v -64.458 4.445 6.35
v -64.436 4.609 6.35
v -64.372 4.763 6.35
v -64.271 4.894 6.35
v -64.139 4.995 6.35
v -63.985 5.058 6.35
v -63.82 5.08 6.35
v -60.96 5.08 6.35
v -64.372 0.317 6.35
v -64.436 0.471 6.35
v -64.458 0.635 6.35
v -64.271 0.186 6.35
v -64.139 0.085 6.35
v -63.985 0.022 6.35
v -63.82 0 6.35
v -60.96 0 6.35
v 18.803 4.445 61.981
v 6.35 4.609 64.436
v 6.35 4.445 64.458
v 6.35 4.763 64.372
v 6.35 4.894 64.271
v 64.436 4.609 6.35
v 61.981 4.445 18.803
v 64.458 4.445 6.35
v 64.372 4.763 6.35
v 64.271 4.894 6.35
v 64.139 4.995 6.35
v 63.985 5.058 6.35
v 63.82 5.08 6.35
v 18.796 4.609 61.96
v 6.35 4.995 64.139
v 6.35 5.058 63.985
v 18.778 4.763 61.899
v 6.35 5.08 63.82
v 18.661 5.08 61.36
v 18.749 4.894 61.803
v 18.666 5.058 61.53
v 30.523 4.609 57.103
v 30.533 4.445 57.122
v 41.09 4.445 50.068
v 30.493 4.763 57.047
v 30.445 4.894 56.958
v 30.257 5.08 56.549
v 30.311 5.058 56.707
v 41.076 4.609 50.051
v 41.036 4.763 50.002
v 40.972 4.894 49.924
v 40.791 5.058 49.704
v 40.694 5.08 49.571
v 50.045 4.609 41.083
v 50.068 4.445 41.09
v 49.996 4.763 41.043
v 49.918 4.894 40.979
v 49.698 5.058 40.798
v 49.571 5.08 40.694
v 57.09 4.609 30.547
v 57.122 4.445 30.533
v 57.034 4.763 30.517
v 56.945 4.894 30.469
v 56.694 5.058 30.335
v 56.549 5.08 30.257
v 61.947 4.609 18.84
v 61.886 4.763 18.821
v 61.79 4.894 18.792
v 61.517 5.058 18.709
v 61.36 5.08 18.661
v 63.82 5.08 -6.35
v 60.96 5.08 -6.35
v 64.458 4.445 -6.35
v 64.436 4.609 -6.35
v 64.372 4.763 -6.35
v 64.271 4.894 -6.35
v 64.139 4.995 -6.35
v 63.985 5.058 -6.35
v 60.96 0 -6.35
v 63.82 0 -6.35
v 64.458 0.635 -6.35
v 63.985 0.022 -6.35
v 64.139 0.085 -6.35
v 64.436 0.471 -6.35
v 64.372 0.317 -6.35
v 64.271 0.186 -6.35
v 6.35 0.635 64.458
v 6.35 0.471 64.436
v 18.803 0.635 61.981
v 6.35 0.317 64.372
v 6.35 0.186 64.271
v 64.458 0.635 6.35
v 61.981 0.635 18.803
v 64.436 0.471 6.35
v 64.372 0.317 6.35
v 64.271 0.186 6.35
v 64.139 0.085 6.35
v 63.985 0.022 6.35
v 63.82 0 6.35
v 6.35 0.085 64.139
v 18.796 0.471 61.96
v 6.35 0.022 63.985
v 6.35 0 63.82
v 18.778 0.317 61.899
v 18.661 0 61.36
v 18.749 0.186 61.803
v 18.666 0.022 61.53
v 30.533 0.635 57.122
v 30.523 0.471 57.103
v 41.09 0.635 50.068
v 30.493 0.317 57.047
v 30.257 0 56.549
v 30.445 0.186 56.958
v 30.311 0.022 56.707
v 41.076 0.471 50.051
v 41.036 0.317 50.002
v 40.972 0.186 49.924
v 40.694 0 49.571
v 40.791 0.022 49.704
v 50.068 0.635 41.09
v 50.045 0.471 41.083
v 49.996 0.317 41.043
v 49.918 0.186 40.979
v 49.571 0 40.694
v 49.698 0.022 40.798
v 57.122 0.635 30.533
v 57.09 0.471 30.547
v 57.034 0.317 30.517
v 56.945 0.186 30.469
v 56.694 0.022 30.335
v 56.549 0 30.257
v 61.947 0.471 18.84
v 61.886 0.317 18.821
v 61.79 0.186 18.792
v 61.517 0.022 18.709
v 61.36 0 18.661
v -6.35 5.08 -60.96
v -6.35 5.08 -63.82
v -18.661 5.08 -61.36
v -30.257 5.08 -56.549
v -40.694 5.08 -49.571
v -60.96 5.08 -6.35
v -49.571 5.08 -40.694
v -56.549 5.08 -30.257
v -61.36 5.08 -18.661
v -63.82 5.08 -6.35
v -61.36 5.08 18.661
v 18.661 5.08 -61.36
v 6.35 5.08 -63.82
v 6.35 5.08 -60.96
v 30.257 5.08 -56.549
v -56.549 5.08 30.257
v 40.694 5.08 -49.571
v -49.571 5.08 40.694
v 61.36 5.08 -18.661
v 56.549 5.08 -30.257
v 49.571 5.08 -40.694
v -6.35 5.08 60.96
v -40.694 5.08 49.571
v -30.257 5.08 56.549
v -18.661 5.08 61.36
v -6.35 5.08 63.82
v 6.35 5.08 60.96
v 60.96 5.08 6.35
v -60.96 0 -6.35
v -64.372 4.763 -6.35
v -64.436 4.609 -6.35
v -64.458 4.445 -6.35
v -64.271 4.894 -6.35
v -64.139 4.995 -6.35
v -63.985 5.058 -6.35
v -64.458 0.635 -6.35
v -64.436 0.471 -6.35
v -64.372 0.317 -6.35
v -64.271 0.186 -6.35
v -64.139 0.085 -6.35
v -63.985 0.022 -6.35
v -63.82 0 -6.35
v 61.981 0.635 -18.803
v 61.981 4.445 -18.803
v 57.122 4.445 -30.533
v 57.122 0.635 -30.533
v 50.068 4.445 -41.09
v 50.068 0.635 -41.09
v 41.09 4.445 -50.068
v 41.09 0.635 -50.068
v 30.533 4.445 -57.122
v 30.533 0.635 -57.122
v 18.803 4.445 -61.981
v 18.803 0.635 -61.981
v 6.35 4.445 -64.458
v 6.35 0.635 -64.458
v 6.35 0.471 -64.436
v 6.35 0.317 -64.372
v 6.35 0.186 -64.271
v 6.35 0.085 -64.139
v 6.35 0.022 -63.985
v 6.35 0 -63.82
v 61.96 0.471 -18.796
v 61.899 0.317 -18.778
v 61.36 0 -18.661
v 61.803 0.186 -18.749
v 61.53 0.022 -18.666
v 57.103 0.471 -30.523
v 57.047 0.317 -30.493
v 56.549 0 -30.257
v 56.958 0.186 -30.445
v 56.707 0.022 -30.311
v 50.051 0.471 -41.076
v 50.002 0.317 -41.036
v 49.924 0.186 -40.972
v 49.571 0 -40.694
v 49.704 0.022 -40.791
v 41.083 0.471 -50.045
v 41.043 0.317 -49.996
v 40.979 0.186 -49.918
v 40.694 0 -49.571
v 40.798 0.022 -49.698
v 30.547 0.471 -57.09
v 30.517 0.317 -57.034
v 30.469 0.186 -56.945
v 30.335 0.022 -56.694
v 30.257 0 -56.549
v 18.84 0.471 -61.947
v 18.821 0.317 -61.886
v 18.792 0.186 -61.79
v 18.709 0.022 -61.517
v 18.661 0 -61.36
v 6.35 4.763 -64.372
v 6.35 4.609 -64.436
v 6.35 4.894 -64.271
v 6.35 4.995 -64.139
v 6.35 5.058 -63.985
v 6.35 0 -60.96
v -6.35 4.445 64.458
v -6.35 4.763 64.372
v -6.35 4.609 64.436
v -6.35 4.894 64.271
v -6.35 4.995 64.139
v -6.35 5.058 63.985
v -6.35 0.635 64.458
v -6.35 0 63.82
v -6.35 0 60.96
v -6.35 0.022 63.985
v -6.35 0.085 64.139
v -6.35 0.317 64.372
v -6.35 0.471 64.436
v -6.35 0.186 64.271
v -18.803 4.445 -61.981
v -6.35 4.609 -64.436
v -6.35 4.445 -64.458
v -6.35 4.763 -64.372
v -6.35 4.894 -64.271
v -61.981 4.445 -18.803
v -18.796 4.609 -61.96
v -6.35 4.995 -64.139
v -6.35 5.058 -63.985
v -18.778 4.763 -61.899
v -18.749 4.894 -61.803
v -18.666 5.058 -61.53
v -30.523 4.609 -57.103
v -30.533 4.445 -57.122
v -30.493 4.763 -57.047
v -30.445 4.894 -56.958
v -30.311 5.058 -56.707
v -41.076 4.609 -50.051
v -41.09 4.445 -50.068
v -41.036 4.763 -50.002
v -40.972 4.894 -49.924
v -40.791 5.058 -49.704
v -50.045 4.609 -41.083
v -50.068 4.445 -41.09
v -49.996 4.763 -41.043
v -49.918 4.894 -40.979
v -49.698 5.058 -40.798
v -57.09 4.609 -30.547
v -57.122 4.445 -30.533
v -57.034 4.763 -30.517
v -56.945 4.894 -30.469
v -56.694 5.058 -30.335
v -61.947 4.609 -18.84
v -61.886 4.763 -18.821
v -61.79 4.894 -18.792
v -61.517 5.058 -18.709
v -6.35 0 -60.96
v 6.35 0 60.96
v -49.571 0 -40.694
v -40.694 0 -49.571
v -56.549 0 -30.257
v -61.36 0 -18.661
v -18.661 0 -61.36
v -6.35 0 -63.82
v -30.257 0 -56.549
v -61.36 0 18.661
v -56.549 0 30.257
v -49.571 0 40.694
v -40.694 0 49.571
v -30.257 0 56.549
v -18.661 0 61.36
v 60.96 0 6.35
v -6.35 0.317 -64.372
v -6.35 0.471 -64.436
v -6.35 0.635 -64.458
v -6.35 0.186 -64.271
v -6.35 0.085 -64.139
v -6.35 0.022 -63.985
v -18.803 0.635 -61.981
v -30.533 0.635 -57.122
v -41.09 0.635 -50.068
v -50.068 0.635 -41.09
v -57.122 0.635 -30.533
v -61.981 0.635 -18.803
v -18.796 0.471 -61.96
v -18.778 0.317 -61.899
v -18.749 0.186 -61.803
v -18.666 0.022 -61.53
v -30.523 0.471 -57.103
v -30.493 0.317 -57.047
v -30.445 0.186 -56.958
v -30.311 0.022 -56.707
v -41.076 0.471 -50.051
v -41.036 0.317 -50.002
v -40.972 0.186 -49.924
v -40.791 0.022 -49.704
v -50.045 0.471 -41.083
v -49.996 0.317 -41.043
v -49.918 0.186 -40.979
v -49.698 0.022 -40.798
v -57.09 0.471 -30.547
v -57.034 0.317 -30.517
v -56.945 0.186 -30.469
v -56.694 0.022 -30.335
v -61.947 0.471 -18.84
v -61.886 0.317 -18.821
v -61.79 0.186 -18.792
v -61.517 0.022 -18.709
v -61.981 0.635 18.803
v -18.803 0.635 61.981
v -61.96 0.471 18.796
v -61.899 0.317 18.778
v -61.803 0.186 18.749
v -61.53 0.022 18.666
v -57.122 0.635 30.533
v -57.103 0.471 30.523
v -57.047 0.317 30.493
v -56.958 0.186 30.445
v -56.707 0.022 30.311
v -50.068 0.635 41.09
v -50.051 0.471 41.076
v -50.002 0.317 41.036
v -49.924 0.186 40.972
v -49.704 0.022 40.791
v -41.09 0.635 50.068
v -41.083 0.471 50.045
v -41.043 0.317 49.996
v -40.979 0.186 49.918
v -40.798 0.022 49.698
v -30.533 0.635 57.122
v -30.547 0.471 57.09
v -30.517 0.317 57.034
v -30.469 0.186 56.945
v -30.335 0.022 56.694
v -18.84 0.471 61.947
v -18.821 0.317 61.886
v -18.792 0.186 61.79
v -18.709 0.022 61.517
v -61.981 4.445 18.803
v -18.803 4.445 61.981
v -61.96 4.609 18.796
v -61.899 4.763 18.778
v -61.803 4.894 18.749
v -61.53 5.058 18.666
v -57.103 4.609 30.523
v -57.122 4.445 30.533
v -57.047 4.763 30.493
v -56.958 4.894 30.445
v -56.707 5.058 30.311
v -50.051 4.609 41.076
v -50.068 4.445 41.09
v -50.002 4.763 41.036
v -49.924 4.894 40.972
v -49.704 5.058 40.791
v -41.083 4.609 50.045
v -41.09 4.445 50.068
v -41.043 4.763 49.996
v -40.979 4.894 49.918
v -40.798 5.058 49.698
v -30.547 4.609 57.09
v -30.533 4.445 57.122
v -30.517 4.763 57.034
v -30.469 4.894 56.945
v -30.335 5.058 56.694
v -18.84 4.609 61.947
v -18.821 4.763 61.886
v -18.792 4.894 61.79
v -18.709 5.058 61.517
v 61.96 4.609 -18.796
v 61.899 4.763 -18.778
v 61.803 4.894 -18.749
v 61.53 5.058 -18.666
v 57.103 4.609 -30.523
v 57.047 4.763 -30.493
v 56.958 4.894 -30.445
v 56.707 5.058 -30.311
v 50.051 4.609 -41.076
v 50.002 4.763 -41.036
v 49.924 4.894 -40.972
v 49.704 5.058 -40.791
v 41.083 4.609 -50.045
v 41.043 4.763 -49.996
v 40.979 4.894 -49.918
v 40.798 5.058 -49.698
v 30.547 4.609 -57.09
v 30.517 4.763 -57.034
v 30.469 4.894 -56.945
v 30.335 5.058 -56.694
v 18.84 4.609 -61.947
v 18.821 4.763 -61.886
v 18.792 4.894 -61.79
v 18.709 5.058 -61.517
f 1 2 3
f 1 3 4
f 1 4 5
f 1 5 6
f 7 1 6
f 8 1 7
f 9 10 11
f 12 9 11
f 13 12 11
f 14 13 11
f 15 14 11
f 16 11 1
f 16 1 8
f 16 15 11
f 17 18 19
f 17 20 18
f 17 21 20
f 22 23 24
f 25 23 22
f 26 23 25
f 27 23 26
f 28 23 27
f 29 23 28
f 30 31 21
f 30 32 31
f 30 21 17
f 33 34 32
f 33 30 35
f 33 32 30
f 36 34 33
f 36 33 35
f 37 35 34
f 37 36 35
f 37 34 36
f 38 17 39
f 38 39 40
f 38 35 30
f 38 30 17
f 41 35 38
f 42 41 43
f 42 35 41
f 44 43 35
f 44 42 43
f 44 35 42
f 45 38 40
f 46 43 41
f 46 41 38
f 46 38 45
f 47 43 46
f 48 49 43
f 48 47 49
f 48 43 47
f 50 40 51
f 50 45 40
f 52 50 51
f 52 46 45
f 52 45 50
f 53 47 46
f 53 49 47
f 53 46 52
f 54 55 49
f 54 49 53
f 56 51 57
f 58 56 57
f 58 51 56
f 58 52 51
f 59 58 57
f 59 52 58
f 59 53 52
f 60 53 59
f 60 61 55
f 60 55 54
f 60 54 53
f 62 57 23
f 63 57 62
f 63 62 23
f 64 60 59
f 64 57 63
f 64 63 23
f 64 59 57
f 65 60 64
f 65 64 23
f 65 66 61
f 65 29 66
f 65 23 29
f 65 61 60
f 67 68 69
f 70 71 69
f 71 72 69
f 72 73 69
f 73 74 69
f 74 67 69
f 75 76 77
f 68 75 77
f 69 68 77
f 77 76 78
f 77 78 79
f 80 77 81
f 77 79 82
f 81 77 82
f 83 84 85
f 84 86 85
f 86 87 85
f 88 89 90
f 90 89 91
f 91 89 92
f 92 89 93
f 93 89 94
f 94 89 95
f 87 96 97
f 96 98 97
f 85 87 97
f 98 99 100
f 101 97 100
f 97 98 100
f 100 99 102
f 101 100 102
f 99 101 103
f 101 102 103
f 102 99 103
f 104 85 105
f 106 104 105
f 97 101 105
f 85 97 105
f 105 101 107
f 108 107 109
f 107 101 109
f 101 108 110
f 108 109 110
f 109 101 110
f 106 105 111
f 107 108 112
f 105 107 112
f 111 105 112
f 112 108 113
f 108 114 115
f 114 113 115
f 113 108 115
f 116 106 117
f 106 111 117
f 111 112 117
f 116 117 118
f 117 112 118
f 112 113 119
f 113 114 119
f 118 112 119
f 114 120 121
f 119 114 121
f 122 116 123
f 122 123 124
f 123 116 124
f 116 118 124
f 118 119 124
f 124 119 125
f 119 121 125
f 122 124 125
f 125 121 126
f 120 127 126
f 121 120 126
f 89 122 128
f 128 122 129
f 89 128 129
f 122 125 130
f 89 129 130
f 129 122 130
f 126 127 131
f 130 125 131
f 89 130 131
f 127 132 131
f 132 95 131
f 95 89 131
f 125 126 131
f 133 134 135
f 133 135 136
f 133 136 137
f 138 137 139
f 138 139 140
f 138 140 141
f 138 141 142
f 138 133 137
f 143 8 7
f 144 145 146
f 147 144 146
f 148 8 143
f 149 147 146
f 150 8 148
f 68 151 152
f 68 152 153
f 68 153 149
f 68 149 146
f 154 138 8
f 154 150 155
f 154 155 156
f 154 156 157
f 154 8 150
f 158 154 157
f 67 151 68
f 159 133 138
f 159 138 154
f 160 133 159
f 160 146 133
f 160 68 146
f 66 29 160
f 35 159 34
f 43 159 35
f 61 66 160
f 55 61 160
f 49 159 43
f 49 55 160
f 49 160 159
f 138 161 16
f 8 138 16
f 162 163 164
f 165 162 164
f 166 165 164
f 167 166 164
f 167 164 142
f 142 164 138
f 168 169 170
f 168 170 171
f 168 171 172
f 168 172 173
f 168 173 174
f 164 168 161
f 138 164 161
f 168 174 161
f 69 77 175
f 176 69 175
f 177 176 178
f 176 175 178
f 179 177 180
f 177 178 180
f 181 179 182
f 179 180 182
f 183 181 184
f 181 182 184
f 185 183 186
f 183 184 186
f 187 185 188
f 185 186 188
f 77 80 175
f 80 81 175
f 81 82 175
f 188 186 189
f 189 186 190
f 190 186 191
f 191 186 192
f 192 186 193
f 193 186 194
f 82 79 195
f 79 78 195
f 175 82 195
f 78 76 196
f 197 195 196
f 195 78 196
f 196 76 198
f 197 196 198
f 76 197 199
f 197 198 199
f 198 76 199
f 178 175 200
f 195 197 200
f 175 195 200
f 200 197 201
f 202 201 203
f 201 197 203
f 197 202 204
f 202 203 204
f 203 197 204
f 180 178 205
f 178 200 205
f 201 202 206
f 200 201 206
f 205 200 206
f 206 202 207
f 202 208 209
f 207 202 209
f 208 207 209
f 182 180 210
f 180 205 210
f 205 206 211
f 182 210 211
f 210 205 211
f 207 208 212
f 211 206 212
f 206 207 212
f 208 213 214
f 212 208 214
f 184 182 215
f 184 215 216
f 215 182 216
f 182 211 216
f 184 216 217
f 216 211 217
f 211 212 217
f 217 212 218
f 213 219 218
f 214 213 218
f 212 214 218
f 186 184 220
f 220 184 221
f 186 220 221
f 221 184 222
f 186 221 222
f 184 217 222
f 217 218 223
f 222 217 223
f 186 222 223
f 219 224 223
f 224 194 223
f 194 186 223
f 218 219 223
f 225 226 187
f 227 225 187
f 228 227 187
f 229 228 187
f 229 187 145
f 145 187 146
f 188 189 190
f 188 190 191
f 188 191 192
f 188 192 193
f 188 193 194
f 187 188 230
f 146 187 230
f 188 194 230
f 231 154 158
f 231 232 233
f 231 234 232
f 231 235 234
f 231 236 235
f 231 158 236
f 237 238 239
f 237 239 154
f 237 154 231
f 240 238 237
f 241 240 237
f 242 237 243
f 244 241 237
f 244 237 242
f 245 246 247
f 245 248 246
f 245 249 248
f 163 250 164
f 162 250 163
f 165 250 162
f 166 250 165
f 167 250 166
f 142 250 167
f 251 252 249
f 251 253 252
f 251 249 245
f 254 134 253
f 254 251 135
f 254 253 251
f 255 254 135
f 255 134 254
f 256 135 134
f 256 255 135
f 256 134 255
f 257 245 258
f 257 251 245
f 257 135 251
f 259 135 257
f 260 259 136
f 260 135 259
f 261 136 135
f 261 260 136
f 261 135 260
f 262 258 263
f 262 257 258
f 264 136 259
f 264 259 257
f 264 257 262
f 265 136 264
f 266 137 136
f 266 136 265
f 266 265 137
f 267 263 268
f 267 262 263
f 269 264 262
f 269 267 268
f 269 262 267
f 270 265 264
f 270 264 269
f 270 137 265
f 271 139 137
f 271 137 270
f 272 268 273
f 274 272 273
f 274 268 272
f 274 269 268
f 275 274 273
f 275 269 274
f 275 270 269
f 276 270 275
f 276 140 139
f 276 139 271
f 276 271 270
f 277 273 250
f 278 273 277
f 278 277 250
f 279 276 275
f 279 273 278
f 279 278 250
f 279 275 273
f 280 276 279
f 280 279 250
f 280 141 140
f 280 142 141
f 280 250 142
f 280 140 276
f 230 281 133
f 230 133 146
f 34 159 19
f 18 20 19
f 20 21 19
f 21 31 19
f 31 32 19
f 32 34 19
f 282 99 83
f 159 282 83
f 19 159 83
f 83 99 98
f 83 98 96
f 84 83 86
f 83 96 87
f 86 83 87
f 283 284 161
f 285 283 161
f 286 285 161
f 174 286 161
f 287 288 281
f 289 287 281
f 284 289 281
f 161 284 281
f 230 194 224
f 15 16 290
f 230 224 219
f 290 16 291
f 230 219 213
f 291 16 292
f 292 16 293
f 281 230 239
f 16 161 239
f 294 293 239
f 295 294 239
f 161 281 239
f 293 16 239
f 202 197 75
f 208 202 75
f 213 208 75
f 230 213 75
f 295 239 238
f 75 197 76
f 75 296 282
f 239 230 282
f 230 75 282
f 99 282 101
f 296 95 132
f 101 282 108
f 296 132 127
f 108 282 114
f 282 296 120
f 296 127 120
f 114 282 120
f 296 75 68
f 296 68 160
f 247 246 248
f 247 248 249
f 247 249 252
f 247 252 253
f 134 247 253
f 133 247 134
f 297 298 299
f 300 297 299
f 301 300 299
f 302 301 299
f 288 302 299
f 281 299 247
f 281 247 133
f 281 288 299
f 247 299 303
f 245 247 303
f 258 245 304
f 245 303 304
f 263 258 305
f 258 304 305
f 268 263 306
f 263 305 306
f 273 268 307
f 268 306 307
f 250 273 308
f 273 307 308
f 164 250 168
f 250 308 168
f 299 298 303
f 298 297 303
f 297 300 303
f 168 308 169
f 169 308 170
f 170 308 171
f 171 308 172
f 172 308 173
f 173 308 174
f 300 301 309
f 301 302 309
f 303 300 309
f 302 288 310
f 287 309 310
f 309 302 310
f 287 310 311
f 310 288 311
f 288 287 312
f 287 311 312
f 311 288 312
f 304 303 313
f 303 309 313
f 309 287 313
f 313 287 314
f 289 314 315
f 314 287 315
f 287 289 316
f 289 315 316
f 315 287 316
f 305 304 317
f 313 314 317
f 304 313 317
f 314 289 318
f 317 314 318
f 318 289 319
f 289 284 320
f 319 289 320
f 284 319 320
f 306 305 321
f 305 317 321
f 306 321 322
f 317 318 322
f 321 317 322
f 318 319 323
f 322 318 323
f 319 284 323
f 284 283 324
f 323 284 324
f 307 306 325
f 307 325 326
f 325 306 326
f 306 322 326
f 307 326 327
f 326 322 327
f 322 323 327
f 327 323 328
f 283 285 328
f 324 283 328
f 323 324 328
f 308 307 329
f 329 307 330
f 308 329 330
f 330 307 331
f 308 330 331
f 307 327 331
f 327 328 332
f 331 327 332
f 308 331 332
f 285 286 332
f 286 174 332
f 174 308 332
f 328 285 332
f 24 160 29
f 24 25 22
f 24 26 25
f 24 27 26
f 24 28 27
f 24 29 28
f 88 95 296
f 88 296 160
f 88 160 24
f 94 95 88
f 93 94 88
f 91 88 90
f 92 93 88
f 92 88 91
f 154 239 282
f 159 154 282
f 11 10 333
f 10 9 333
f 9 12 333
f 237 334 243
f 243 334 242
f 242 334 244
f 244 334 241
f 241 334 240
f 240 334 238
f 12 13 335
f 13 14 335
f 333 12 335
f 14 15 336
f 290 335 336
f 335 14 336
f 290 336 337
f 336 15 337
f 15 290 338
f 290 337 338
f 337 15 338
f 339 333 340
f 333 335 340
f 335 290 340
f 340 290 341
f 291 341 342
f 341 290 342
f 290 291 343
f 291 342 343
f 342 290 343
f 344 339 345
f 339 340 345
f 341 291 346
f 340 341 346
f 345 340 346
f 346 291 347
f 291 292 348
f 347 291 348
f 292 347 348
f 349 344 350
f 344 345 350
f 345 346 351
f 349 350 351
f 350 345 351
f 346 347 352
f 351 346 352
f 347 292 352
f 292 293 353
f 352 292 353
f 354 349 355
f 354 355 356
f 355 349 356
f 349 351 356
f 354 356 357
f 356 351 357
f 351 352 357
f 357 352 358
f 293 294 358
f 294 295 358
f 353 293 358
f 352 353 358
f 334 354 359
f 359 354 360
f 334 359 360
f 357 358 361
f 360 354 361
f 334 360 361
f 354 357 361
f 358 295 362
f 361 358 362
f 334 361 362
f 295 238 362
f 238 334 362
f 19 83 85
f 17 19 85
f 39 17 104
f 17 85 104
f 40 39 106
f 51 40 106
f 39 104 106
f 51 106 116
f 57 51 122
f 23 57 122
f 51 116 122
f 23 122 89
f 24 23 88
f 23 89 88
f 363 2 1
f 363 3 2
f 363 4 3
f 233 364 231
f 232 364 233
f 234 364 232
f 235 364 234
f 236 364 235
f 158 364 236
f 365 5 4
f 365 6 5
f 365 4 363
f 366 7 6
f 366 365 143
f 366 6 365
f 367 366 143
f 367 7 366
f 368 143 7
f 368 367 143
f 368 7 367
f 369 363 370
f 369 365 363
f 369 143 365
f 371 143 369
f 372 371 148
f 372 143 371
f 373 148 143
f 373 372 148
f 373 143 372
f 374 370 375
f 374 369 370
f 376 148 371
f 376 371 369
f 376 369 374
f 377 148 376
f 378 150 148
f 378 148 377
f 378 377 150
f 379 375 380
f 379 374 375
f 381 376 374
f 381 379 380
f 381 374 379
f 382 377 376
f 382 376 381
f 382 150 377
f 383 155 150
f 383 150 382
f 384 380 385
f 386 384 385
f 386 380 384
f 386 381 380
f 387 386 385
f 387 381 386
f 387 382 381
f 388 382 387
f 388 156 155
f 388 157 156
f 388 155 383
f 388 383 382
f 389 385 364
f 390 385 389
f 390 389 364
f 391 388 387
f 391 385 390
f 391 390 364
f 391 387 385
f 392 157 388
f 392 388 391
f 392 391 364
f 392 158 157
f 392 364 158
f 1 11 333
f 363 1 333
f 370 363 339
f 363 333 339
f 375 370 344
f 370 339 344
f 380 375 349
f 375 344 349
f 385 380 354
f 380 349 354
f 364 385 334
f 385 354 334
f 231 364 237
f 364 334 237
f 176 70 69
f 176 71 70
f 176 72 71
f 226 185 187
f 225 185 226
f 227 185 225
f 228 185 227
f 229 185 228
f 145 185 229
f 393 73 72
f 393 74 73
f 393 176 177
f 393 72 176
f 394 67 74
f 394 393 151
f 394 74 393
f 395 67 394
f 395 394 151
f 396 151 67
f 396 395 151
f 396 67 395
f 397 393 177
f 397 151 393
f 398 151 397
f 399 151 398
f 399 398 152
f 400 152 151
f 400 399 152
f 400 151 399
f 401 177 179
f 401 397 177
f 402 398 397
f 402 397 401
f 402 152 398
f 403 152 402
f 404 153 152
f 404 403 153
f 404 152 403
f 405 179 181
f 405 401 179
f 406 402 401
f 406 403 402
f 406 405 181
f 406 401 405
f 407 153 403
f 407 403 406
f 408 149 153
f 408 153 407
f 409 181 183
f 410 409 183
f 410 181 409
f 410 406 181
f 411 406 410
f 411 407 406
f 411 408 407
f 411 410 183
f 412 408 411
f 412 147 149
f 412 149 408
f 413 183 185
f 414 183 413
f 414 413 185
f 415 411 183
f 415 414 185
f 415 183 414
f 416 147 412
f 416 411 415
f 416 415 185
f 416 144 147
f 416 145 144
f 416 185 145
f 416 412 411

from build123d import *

# Parameters (mm, degrees)
SKETCH2_R           = 64.77
BOSS_EXTRUDE1_DEPTH = 5.08
FILLET1_R           = 0.635
SKETCH3_W           = 12.7
SKETCH3_H           = 15.225369524
SKETCH3_W_2         = 15.225369524
SKETCH3_H_2         = 12.7
CUT_EXTRUDE1_DEPTH  = 92.739371117


with BuildPart() as part:
    # Sketch2 → Boss-Extrude1 (new body)
    with BuildSketch(Plane(origin=(0, 0, 0), x_dir=(1, 0, 0), z_dir=(0, 1, 0))):
        with Locations(Location((0, 0, 0), (0, 0, 270))):
            Circle(SKETCH2_R)
    extrude(amount=BOSS_EXTRUDE1_DEPTH)

    # Fillet1
    fillet1_edges = [part.edges().sort_by_distance(p)[0] for p in [
        (0, 0, -64.77),
        (0, 5.08, -64.77),
    ]]
    fillet(fillet1_edges, radius=FILLET1_R)

    # Sketch3 → Cut-Extrude1 (cut, through all)
    with BuildSketch(Plane.XZ):
        with Locations((0, 68.572684762)):
            Rectangle(SKETCH3_W, SKETCH3_H)
        with Locations((68.572684762, 0)):
            Rectangle(SKETCH3_W_2, SKETCH3_H_2)
        with Locations((0, -68.572684762)):
            Rectangle(SKETCH3_W, SKETCH3_H)
        with Locations((-68.572684762, 0)):
            Rectangle(SKETCH3_W_2, SKETCH3_H_2)
    extrude(amount=-CUT_EXTRUDE1_DEPTH, mode=Mode.SUBTRACT)


solid = part.part
